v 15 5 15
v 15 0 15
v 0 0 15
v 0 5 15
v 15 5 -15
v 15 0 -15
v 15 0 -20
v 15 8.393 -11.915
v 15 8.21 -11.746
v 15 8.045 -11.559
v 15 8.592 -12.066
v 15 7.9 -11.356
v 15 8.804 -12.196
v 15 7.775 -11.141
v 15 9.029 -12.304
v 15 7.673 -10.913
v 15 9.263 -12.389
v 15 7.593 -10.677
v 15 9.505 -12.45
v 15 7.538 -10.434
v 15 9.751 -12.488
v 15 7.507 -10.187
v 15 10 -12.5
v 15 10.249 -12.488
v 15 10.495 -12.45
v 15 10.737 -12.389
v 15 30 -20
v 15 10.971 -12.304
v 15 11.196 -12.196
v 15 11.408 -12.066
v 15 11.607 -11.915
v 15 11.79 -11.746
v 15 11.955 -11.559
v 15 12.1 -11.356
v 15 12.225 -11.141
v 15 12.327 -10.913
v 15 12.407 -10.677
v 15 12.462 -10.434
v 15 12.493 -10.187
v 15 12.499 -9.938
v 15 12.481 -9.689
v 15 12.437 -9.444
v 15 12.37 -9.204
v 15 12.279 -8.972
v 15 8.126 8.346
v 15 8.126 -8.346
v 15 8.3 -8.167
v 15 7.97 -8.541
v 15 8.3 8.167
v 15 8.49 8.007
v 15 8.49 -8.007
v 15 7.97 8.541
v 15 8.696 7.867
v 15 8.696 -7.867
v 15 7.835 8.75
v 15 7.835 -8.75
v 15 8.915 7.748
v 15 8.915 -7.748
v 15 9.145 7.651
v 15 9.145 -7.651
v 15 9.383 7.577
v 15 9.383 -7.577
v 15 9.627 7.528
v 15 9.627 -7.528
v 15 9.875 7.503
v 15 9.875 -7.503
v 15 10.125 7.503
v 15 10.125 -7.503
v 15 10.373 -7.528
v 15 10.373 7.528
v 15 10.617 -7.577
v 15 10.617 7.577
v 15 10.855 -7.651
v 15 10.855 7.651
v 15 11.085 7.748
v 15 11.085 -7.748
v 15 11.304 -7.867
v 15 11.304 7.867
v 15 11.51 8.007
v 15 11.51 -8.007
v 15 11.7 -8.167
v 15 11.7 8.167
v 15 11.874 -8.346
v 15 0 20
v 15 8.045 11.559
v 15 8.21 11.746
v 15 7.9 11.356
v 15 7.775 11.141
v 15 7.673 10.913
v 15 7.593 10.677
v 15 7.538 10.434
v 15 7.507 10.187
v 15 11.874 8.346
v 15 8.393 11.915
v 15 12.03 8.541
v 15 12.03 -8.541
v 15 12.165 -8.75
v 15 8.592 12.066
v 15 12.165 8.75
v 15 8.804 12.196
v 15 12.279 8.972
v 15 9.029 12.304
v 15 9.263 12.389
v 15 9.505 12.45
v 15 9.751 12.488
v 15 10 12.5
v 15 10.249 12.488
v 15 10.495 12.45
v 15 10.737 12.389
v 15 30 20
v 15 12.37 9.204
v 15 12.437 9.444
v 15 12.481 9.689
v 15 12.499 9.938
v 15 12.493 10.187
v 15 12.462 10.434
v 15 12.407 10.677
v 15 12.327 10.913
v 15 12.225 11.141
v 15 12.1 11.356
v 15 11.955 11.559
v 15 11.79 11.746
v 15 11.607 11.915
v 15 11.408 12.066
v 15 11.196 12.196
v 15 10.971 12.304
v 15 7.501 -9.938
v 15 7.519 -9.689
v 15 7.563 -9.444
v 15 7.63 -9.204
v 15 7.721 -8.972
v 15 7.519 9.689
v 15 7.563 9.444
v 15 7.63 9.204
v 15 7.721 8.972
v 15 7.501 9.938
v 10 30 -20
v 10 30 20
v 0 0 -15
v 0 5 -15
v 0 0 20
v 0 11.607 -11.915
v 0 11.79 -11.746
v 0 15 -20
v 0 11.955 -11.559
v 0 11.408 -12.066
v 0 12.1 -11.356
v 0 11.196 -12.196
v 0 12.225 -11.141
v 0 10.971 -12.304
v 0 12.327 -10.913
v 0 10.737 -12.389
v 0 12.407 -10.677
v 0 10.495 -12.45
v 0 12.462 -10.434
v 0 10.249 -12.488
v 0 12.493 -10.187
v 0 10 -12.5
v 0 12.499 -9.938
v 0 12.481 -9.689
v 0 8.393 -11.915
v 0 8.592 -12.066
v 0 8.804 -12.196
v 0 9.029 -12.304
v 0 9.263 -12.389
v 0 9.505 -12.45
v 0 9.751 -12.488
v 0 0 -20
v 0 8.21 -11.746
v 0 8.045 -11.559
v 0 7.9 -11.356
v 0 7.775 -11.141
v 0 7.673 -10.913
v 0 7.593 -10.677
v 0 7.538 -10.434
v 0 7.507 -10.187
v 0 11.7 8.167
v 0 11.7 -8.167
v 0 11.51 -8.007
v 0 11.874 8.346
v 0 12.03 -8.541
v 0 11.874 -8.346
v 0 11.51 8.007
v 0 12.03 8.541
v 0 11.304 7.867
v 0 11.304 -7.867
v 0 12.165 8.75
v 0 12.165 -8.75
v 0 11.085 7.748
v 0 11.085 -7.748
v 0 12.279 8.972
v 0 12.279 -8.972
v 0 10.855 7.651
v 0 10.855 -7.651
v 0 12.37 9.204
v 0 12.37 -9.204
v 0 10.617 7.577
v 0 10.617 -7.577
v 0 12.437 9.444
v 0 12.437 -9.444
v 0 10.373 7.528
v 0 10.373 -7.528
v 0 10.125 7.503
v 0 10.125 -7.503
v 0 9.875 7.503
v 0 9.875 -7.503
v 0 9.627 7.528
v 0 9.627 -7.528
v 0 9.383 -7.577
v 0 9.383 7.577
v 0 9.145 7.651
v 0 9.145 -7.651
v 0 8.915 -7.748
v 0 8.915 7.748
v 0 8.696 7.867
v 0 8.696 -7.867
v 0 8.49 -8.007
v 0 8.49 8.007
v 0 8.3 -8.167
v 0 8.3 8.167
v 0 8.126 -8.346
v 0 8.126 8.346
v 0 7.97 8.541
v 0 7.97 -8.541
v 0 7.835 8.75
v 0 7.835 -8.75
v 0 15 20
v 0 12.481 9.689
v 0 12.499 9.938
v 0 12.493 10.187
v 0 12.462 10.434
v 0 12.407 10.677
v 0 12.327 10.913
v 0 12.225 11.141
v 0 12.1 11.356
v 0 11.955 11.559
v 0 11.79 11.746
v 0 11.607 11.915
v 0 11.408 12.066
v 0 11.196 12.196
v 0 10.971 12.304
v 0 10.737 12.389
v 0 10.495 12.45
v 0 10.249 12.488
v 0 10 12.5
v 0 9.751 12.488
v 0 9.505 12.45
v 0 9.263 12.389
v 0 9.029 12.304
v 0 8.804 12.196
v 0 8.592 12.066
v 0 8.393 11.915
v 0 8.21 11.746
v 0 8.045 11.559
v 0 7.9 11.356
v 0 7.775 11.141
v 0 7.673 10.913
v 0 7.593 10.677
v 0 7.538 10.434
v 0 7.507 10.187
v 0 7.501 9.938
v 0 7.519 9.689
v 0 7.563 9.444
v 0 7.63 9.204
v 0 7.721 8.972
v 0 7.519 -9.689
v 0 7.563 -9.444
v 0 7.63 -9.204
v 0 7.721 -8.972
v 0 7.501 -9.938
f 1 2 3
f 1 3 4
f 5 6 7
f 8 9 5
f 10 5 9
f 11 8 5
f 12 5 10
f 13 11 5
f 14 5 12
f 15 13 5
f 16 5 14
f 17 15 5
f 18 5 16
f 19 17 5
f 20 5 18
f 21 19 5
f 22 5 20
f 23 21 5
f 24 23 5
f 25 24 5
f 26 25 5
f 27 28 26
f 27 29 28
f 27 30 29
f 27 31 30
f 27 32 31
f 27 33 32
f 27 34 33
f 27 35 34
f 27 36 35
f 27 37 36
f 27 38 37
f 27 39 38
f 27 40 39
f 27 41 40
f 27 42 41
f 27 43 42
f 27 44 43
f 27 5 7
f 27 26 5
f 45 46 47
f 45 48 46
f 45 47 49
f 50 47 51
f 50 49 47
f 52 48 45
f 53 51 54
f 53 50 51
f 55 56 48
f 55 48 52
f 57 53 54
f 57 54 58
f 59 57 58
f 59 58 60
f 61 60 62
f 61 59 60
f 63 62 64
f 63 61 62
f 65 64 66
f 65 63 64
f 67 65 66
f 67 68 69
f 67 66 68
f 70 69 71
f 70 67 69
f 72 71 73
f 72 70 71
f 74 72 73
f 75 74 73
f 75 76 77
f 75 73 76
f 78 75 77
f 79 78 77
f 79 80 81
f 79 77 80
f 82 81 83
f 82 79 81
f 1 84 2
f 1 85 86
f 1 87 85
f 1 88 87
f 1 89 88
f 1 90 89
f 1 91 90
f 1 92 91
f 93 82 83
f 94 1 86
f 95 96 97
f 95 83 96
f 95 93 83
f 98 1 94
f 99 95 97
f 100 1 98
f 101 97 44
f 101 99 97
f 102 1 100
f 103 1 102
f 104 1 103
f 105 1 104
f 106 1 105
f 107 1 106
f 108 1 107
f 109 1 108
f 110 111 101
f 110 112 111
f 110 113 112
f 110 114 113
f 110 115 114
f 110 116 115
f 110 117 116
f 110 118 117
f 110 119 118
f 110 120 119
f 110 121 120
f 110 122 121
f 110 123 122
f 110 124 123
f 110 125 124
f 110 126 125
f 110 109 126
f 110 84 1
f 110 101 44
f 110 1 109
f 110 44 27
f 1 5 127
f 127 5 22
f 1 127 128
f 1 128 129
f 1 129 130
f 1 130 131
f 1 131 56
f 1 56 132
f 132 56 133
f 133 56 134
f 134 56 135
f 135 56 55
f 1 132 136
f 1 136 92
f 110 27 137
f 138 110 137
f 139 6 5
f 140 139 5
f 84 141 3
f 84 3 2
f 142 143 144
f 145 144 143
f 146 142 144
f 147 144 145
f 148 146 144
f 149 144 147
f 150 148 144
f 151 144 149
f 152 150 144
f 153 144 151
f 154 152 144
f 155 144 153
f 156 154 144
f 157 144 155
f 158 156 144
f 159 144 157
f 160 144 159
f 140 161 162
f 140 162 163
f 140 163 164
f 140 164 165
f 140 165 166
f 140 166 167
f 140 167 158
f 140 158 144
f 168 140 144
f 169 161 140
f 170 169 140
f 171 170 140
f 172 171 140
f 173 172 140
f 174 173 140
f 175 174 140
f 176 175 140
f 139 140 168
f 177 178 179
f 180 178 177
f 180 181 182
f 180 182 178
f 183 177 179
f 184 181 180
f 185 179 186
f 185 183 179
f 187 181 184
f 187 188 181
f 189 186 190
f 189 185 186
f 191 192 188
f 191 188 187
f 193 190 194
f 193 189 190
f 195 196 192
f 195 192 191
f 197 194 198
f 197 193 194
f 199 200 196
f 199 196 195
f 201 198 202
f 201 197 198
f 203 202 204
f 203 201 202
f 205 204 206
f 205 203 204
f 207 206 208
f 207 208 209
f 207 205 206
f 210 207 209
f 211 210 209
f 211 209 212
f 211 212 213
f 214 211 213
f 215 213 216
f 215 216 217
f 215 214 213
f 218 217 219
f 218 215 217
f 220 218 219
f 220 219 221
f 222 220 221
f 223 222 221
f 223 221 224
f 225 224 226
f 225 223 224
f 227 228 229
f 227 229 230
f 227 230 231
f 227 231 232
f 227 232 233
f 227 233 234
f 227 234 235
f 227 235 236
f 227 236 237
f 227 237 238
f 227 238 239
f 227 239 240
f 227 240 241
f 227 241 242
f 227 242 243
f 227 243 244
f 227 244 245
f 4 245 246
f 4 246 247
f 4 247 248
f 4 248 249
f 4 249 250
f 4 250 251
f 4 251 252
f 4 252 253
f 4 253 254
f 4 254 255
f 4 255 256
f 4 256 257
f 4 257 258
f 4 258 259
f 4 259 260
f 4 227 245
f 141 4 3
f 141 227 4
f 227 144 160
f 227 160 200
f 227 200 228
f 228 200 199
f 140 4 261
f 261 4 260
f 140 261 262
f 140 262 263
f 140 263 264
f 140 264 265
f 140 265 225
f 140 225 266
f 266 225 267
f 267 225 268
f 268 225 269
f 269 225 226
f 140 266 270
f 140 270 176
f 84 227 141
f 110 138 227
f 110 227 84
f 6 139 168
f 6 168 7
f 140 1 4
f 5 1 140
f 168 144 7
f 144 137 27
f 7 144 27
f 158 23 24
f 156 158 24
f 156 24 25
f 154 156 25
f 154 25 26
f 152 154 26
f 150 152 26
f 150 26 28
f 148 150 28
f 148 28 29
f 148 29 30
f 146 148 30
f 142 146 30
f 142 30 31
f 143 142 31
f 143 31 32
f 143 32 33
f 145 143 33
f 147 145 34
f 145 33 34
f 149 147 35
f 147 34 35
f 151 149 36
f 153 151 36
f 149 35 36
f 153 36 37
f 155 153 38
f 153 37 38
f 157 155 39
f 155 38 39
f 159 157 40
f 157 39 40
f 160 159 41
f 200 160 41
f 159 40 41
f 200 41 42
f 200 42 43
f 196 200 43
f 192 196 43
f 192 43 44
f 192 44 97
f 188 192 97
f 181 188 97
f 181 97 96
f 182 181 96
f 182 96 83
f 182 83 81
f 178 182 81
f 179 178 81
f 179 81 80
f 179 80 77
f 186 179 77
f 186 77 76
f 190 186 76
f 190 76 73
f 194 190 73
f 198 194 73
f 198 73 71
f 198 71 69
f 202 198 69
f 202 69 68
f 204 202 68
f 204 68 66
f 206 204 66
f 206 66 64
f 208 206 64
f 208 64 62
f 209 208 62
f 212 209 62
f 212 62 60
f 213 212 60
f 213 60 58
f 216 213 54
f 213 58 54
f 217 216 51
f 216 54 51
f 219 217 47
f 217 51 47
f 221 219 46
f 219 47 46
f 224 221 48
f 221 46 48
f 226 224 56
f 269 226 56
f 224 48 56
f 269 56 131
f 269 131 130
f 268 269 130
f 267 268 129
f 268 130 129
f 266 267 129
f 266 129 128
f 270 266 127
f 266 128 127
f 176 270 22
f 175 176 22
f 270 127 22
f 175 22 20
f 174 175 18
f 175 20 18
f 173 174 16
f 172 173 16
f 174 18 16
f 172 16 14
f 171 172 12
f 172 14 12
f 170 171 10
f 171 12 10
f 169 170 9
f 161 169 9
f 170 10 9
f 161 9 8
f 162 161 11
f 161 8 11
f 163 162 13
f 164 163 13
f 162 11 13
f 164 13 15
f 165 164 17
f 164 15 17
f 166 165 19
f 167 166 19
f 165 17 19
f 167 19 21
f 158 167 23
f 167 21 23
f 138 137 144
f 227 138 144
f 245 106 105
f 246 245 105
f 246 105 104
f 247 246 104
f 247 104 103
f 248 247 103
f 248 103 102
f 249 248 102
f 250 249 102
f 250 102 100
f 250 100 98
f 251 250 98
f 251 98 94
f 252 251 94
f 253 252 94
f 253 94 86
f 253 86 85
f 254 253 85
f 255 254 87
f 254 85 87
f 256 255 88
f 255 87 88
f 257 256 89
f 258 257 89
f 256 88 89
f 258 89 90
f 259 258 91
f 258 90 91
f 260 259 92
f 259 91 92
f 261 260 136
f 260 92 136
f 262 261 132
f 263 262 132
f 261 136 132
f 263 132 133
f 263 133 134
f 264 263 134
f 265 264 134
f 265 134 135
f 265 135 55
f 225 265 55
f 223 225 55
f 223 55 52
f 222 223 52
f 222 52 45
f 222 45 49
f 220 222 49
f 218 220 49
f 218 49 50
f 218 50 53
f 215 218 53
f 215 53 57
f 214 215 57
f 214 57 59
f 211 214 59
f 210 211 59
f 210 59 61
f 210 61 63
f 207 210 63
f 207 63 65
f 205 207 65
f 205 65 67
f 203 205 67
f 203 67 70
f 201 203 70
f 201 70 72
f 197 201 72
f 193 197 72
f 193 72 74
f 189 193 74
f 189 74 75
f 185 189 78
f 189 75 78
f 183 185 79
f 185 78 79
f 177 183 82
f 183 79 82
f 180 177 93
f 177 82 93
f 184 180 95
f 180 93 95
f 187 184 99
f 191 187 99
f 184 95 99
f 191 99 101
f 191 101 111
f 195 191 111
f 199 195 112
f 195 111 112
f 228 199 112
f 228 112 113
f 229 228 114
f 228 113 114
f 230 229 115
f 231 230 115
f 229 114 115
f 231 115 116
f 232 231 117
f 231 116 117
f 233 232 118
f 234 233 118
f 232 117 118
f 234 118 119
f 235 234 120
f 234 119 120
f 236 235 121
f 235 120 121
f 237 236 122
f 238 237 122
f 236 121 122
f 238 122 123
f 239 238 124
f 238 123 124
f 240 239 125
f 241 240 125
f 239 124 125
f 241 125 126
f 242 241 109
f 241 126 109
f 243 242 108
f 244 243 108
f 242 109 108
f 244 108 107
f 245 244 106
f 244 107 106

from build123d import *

# Parameters (mm, degrees)
BOSS_EXTRUDE1_DEPTH = 20
SKETCH2_R           = 2.5
SKETCH2_W           = 30
SKETCH2_H           = 5
CUT_EXTRUDE1_DEPTH  = 40.05124838


with BuildPart() as part:
    # Sketch1 → Boss-Extrude1 (new, symmetric)
    with BuildSketch(Plane.XY):
        Polygon((0, 0), (15, 0), (15, 30), (10, 30), (0, 15), align=None)
    extrude(amount=BOSS_EXTRUDE1_DEPTH, both=True)

    # Sketch2 → Cut-Extrude1 (cut, through all)
    with BuildSketch(Plane(origin=(15, 0, 0), x_dir=(0, 0, -1), z_dir=(1, 0, 0))):
        with Locations((10, 10)):
            Circle(SKETCH2_R)
        with Locations(Location((-10, 10, 0), (0, 0, 180))):
            Circle(SKETCH2_R)
        with Locations((0, 2.5)):
            Rectangle(SKETCH2_W, SKETCH2_H)
    extrude(amount=-CUT_EXTRUDE1_DEPTH, mode=Mode.SUBTRACT)


solid = part.part
